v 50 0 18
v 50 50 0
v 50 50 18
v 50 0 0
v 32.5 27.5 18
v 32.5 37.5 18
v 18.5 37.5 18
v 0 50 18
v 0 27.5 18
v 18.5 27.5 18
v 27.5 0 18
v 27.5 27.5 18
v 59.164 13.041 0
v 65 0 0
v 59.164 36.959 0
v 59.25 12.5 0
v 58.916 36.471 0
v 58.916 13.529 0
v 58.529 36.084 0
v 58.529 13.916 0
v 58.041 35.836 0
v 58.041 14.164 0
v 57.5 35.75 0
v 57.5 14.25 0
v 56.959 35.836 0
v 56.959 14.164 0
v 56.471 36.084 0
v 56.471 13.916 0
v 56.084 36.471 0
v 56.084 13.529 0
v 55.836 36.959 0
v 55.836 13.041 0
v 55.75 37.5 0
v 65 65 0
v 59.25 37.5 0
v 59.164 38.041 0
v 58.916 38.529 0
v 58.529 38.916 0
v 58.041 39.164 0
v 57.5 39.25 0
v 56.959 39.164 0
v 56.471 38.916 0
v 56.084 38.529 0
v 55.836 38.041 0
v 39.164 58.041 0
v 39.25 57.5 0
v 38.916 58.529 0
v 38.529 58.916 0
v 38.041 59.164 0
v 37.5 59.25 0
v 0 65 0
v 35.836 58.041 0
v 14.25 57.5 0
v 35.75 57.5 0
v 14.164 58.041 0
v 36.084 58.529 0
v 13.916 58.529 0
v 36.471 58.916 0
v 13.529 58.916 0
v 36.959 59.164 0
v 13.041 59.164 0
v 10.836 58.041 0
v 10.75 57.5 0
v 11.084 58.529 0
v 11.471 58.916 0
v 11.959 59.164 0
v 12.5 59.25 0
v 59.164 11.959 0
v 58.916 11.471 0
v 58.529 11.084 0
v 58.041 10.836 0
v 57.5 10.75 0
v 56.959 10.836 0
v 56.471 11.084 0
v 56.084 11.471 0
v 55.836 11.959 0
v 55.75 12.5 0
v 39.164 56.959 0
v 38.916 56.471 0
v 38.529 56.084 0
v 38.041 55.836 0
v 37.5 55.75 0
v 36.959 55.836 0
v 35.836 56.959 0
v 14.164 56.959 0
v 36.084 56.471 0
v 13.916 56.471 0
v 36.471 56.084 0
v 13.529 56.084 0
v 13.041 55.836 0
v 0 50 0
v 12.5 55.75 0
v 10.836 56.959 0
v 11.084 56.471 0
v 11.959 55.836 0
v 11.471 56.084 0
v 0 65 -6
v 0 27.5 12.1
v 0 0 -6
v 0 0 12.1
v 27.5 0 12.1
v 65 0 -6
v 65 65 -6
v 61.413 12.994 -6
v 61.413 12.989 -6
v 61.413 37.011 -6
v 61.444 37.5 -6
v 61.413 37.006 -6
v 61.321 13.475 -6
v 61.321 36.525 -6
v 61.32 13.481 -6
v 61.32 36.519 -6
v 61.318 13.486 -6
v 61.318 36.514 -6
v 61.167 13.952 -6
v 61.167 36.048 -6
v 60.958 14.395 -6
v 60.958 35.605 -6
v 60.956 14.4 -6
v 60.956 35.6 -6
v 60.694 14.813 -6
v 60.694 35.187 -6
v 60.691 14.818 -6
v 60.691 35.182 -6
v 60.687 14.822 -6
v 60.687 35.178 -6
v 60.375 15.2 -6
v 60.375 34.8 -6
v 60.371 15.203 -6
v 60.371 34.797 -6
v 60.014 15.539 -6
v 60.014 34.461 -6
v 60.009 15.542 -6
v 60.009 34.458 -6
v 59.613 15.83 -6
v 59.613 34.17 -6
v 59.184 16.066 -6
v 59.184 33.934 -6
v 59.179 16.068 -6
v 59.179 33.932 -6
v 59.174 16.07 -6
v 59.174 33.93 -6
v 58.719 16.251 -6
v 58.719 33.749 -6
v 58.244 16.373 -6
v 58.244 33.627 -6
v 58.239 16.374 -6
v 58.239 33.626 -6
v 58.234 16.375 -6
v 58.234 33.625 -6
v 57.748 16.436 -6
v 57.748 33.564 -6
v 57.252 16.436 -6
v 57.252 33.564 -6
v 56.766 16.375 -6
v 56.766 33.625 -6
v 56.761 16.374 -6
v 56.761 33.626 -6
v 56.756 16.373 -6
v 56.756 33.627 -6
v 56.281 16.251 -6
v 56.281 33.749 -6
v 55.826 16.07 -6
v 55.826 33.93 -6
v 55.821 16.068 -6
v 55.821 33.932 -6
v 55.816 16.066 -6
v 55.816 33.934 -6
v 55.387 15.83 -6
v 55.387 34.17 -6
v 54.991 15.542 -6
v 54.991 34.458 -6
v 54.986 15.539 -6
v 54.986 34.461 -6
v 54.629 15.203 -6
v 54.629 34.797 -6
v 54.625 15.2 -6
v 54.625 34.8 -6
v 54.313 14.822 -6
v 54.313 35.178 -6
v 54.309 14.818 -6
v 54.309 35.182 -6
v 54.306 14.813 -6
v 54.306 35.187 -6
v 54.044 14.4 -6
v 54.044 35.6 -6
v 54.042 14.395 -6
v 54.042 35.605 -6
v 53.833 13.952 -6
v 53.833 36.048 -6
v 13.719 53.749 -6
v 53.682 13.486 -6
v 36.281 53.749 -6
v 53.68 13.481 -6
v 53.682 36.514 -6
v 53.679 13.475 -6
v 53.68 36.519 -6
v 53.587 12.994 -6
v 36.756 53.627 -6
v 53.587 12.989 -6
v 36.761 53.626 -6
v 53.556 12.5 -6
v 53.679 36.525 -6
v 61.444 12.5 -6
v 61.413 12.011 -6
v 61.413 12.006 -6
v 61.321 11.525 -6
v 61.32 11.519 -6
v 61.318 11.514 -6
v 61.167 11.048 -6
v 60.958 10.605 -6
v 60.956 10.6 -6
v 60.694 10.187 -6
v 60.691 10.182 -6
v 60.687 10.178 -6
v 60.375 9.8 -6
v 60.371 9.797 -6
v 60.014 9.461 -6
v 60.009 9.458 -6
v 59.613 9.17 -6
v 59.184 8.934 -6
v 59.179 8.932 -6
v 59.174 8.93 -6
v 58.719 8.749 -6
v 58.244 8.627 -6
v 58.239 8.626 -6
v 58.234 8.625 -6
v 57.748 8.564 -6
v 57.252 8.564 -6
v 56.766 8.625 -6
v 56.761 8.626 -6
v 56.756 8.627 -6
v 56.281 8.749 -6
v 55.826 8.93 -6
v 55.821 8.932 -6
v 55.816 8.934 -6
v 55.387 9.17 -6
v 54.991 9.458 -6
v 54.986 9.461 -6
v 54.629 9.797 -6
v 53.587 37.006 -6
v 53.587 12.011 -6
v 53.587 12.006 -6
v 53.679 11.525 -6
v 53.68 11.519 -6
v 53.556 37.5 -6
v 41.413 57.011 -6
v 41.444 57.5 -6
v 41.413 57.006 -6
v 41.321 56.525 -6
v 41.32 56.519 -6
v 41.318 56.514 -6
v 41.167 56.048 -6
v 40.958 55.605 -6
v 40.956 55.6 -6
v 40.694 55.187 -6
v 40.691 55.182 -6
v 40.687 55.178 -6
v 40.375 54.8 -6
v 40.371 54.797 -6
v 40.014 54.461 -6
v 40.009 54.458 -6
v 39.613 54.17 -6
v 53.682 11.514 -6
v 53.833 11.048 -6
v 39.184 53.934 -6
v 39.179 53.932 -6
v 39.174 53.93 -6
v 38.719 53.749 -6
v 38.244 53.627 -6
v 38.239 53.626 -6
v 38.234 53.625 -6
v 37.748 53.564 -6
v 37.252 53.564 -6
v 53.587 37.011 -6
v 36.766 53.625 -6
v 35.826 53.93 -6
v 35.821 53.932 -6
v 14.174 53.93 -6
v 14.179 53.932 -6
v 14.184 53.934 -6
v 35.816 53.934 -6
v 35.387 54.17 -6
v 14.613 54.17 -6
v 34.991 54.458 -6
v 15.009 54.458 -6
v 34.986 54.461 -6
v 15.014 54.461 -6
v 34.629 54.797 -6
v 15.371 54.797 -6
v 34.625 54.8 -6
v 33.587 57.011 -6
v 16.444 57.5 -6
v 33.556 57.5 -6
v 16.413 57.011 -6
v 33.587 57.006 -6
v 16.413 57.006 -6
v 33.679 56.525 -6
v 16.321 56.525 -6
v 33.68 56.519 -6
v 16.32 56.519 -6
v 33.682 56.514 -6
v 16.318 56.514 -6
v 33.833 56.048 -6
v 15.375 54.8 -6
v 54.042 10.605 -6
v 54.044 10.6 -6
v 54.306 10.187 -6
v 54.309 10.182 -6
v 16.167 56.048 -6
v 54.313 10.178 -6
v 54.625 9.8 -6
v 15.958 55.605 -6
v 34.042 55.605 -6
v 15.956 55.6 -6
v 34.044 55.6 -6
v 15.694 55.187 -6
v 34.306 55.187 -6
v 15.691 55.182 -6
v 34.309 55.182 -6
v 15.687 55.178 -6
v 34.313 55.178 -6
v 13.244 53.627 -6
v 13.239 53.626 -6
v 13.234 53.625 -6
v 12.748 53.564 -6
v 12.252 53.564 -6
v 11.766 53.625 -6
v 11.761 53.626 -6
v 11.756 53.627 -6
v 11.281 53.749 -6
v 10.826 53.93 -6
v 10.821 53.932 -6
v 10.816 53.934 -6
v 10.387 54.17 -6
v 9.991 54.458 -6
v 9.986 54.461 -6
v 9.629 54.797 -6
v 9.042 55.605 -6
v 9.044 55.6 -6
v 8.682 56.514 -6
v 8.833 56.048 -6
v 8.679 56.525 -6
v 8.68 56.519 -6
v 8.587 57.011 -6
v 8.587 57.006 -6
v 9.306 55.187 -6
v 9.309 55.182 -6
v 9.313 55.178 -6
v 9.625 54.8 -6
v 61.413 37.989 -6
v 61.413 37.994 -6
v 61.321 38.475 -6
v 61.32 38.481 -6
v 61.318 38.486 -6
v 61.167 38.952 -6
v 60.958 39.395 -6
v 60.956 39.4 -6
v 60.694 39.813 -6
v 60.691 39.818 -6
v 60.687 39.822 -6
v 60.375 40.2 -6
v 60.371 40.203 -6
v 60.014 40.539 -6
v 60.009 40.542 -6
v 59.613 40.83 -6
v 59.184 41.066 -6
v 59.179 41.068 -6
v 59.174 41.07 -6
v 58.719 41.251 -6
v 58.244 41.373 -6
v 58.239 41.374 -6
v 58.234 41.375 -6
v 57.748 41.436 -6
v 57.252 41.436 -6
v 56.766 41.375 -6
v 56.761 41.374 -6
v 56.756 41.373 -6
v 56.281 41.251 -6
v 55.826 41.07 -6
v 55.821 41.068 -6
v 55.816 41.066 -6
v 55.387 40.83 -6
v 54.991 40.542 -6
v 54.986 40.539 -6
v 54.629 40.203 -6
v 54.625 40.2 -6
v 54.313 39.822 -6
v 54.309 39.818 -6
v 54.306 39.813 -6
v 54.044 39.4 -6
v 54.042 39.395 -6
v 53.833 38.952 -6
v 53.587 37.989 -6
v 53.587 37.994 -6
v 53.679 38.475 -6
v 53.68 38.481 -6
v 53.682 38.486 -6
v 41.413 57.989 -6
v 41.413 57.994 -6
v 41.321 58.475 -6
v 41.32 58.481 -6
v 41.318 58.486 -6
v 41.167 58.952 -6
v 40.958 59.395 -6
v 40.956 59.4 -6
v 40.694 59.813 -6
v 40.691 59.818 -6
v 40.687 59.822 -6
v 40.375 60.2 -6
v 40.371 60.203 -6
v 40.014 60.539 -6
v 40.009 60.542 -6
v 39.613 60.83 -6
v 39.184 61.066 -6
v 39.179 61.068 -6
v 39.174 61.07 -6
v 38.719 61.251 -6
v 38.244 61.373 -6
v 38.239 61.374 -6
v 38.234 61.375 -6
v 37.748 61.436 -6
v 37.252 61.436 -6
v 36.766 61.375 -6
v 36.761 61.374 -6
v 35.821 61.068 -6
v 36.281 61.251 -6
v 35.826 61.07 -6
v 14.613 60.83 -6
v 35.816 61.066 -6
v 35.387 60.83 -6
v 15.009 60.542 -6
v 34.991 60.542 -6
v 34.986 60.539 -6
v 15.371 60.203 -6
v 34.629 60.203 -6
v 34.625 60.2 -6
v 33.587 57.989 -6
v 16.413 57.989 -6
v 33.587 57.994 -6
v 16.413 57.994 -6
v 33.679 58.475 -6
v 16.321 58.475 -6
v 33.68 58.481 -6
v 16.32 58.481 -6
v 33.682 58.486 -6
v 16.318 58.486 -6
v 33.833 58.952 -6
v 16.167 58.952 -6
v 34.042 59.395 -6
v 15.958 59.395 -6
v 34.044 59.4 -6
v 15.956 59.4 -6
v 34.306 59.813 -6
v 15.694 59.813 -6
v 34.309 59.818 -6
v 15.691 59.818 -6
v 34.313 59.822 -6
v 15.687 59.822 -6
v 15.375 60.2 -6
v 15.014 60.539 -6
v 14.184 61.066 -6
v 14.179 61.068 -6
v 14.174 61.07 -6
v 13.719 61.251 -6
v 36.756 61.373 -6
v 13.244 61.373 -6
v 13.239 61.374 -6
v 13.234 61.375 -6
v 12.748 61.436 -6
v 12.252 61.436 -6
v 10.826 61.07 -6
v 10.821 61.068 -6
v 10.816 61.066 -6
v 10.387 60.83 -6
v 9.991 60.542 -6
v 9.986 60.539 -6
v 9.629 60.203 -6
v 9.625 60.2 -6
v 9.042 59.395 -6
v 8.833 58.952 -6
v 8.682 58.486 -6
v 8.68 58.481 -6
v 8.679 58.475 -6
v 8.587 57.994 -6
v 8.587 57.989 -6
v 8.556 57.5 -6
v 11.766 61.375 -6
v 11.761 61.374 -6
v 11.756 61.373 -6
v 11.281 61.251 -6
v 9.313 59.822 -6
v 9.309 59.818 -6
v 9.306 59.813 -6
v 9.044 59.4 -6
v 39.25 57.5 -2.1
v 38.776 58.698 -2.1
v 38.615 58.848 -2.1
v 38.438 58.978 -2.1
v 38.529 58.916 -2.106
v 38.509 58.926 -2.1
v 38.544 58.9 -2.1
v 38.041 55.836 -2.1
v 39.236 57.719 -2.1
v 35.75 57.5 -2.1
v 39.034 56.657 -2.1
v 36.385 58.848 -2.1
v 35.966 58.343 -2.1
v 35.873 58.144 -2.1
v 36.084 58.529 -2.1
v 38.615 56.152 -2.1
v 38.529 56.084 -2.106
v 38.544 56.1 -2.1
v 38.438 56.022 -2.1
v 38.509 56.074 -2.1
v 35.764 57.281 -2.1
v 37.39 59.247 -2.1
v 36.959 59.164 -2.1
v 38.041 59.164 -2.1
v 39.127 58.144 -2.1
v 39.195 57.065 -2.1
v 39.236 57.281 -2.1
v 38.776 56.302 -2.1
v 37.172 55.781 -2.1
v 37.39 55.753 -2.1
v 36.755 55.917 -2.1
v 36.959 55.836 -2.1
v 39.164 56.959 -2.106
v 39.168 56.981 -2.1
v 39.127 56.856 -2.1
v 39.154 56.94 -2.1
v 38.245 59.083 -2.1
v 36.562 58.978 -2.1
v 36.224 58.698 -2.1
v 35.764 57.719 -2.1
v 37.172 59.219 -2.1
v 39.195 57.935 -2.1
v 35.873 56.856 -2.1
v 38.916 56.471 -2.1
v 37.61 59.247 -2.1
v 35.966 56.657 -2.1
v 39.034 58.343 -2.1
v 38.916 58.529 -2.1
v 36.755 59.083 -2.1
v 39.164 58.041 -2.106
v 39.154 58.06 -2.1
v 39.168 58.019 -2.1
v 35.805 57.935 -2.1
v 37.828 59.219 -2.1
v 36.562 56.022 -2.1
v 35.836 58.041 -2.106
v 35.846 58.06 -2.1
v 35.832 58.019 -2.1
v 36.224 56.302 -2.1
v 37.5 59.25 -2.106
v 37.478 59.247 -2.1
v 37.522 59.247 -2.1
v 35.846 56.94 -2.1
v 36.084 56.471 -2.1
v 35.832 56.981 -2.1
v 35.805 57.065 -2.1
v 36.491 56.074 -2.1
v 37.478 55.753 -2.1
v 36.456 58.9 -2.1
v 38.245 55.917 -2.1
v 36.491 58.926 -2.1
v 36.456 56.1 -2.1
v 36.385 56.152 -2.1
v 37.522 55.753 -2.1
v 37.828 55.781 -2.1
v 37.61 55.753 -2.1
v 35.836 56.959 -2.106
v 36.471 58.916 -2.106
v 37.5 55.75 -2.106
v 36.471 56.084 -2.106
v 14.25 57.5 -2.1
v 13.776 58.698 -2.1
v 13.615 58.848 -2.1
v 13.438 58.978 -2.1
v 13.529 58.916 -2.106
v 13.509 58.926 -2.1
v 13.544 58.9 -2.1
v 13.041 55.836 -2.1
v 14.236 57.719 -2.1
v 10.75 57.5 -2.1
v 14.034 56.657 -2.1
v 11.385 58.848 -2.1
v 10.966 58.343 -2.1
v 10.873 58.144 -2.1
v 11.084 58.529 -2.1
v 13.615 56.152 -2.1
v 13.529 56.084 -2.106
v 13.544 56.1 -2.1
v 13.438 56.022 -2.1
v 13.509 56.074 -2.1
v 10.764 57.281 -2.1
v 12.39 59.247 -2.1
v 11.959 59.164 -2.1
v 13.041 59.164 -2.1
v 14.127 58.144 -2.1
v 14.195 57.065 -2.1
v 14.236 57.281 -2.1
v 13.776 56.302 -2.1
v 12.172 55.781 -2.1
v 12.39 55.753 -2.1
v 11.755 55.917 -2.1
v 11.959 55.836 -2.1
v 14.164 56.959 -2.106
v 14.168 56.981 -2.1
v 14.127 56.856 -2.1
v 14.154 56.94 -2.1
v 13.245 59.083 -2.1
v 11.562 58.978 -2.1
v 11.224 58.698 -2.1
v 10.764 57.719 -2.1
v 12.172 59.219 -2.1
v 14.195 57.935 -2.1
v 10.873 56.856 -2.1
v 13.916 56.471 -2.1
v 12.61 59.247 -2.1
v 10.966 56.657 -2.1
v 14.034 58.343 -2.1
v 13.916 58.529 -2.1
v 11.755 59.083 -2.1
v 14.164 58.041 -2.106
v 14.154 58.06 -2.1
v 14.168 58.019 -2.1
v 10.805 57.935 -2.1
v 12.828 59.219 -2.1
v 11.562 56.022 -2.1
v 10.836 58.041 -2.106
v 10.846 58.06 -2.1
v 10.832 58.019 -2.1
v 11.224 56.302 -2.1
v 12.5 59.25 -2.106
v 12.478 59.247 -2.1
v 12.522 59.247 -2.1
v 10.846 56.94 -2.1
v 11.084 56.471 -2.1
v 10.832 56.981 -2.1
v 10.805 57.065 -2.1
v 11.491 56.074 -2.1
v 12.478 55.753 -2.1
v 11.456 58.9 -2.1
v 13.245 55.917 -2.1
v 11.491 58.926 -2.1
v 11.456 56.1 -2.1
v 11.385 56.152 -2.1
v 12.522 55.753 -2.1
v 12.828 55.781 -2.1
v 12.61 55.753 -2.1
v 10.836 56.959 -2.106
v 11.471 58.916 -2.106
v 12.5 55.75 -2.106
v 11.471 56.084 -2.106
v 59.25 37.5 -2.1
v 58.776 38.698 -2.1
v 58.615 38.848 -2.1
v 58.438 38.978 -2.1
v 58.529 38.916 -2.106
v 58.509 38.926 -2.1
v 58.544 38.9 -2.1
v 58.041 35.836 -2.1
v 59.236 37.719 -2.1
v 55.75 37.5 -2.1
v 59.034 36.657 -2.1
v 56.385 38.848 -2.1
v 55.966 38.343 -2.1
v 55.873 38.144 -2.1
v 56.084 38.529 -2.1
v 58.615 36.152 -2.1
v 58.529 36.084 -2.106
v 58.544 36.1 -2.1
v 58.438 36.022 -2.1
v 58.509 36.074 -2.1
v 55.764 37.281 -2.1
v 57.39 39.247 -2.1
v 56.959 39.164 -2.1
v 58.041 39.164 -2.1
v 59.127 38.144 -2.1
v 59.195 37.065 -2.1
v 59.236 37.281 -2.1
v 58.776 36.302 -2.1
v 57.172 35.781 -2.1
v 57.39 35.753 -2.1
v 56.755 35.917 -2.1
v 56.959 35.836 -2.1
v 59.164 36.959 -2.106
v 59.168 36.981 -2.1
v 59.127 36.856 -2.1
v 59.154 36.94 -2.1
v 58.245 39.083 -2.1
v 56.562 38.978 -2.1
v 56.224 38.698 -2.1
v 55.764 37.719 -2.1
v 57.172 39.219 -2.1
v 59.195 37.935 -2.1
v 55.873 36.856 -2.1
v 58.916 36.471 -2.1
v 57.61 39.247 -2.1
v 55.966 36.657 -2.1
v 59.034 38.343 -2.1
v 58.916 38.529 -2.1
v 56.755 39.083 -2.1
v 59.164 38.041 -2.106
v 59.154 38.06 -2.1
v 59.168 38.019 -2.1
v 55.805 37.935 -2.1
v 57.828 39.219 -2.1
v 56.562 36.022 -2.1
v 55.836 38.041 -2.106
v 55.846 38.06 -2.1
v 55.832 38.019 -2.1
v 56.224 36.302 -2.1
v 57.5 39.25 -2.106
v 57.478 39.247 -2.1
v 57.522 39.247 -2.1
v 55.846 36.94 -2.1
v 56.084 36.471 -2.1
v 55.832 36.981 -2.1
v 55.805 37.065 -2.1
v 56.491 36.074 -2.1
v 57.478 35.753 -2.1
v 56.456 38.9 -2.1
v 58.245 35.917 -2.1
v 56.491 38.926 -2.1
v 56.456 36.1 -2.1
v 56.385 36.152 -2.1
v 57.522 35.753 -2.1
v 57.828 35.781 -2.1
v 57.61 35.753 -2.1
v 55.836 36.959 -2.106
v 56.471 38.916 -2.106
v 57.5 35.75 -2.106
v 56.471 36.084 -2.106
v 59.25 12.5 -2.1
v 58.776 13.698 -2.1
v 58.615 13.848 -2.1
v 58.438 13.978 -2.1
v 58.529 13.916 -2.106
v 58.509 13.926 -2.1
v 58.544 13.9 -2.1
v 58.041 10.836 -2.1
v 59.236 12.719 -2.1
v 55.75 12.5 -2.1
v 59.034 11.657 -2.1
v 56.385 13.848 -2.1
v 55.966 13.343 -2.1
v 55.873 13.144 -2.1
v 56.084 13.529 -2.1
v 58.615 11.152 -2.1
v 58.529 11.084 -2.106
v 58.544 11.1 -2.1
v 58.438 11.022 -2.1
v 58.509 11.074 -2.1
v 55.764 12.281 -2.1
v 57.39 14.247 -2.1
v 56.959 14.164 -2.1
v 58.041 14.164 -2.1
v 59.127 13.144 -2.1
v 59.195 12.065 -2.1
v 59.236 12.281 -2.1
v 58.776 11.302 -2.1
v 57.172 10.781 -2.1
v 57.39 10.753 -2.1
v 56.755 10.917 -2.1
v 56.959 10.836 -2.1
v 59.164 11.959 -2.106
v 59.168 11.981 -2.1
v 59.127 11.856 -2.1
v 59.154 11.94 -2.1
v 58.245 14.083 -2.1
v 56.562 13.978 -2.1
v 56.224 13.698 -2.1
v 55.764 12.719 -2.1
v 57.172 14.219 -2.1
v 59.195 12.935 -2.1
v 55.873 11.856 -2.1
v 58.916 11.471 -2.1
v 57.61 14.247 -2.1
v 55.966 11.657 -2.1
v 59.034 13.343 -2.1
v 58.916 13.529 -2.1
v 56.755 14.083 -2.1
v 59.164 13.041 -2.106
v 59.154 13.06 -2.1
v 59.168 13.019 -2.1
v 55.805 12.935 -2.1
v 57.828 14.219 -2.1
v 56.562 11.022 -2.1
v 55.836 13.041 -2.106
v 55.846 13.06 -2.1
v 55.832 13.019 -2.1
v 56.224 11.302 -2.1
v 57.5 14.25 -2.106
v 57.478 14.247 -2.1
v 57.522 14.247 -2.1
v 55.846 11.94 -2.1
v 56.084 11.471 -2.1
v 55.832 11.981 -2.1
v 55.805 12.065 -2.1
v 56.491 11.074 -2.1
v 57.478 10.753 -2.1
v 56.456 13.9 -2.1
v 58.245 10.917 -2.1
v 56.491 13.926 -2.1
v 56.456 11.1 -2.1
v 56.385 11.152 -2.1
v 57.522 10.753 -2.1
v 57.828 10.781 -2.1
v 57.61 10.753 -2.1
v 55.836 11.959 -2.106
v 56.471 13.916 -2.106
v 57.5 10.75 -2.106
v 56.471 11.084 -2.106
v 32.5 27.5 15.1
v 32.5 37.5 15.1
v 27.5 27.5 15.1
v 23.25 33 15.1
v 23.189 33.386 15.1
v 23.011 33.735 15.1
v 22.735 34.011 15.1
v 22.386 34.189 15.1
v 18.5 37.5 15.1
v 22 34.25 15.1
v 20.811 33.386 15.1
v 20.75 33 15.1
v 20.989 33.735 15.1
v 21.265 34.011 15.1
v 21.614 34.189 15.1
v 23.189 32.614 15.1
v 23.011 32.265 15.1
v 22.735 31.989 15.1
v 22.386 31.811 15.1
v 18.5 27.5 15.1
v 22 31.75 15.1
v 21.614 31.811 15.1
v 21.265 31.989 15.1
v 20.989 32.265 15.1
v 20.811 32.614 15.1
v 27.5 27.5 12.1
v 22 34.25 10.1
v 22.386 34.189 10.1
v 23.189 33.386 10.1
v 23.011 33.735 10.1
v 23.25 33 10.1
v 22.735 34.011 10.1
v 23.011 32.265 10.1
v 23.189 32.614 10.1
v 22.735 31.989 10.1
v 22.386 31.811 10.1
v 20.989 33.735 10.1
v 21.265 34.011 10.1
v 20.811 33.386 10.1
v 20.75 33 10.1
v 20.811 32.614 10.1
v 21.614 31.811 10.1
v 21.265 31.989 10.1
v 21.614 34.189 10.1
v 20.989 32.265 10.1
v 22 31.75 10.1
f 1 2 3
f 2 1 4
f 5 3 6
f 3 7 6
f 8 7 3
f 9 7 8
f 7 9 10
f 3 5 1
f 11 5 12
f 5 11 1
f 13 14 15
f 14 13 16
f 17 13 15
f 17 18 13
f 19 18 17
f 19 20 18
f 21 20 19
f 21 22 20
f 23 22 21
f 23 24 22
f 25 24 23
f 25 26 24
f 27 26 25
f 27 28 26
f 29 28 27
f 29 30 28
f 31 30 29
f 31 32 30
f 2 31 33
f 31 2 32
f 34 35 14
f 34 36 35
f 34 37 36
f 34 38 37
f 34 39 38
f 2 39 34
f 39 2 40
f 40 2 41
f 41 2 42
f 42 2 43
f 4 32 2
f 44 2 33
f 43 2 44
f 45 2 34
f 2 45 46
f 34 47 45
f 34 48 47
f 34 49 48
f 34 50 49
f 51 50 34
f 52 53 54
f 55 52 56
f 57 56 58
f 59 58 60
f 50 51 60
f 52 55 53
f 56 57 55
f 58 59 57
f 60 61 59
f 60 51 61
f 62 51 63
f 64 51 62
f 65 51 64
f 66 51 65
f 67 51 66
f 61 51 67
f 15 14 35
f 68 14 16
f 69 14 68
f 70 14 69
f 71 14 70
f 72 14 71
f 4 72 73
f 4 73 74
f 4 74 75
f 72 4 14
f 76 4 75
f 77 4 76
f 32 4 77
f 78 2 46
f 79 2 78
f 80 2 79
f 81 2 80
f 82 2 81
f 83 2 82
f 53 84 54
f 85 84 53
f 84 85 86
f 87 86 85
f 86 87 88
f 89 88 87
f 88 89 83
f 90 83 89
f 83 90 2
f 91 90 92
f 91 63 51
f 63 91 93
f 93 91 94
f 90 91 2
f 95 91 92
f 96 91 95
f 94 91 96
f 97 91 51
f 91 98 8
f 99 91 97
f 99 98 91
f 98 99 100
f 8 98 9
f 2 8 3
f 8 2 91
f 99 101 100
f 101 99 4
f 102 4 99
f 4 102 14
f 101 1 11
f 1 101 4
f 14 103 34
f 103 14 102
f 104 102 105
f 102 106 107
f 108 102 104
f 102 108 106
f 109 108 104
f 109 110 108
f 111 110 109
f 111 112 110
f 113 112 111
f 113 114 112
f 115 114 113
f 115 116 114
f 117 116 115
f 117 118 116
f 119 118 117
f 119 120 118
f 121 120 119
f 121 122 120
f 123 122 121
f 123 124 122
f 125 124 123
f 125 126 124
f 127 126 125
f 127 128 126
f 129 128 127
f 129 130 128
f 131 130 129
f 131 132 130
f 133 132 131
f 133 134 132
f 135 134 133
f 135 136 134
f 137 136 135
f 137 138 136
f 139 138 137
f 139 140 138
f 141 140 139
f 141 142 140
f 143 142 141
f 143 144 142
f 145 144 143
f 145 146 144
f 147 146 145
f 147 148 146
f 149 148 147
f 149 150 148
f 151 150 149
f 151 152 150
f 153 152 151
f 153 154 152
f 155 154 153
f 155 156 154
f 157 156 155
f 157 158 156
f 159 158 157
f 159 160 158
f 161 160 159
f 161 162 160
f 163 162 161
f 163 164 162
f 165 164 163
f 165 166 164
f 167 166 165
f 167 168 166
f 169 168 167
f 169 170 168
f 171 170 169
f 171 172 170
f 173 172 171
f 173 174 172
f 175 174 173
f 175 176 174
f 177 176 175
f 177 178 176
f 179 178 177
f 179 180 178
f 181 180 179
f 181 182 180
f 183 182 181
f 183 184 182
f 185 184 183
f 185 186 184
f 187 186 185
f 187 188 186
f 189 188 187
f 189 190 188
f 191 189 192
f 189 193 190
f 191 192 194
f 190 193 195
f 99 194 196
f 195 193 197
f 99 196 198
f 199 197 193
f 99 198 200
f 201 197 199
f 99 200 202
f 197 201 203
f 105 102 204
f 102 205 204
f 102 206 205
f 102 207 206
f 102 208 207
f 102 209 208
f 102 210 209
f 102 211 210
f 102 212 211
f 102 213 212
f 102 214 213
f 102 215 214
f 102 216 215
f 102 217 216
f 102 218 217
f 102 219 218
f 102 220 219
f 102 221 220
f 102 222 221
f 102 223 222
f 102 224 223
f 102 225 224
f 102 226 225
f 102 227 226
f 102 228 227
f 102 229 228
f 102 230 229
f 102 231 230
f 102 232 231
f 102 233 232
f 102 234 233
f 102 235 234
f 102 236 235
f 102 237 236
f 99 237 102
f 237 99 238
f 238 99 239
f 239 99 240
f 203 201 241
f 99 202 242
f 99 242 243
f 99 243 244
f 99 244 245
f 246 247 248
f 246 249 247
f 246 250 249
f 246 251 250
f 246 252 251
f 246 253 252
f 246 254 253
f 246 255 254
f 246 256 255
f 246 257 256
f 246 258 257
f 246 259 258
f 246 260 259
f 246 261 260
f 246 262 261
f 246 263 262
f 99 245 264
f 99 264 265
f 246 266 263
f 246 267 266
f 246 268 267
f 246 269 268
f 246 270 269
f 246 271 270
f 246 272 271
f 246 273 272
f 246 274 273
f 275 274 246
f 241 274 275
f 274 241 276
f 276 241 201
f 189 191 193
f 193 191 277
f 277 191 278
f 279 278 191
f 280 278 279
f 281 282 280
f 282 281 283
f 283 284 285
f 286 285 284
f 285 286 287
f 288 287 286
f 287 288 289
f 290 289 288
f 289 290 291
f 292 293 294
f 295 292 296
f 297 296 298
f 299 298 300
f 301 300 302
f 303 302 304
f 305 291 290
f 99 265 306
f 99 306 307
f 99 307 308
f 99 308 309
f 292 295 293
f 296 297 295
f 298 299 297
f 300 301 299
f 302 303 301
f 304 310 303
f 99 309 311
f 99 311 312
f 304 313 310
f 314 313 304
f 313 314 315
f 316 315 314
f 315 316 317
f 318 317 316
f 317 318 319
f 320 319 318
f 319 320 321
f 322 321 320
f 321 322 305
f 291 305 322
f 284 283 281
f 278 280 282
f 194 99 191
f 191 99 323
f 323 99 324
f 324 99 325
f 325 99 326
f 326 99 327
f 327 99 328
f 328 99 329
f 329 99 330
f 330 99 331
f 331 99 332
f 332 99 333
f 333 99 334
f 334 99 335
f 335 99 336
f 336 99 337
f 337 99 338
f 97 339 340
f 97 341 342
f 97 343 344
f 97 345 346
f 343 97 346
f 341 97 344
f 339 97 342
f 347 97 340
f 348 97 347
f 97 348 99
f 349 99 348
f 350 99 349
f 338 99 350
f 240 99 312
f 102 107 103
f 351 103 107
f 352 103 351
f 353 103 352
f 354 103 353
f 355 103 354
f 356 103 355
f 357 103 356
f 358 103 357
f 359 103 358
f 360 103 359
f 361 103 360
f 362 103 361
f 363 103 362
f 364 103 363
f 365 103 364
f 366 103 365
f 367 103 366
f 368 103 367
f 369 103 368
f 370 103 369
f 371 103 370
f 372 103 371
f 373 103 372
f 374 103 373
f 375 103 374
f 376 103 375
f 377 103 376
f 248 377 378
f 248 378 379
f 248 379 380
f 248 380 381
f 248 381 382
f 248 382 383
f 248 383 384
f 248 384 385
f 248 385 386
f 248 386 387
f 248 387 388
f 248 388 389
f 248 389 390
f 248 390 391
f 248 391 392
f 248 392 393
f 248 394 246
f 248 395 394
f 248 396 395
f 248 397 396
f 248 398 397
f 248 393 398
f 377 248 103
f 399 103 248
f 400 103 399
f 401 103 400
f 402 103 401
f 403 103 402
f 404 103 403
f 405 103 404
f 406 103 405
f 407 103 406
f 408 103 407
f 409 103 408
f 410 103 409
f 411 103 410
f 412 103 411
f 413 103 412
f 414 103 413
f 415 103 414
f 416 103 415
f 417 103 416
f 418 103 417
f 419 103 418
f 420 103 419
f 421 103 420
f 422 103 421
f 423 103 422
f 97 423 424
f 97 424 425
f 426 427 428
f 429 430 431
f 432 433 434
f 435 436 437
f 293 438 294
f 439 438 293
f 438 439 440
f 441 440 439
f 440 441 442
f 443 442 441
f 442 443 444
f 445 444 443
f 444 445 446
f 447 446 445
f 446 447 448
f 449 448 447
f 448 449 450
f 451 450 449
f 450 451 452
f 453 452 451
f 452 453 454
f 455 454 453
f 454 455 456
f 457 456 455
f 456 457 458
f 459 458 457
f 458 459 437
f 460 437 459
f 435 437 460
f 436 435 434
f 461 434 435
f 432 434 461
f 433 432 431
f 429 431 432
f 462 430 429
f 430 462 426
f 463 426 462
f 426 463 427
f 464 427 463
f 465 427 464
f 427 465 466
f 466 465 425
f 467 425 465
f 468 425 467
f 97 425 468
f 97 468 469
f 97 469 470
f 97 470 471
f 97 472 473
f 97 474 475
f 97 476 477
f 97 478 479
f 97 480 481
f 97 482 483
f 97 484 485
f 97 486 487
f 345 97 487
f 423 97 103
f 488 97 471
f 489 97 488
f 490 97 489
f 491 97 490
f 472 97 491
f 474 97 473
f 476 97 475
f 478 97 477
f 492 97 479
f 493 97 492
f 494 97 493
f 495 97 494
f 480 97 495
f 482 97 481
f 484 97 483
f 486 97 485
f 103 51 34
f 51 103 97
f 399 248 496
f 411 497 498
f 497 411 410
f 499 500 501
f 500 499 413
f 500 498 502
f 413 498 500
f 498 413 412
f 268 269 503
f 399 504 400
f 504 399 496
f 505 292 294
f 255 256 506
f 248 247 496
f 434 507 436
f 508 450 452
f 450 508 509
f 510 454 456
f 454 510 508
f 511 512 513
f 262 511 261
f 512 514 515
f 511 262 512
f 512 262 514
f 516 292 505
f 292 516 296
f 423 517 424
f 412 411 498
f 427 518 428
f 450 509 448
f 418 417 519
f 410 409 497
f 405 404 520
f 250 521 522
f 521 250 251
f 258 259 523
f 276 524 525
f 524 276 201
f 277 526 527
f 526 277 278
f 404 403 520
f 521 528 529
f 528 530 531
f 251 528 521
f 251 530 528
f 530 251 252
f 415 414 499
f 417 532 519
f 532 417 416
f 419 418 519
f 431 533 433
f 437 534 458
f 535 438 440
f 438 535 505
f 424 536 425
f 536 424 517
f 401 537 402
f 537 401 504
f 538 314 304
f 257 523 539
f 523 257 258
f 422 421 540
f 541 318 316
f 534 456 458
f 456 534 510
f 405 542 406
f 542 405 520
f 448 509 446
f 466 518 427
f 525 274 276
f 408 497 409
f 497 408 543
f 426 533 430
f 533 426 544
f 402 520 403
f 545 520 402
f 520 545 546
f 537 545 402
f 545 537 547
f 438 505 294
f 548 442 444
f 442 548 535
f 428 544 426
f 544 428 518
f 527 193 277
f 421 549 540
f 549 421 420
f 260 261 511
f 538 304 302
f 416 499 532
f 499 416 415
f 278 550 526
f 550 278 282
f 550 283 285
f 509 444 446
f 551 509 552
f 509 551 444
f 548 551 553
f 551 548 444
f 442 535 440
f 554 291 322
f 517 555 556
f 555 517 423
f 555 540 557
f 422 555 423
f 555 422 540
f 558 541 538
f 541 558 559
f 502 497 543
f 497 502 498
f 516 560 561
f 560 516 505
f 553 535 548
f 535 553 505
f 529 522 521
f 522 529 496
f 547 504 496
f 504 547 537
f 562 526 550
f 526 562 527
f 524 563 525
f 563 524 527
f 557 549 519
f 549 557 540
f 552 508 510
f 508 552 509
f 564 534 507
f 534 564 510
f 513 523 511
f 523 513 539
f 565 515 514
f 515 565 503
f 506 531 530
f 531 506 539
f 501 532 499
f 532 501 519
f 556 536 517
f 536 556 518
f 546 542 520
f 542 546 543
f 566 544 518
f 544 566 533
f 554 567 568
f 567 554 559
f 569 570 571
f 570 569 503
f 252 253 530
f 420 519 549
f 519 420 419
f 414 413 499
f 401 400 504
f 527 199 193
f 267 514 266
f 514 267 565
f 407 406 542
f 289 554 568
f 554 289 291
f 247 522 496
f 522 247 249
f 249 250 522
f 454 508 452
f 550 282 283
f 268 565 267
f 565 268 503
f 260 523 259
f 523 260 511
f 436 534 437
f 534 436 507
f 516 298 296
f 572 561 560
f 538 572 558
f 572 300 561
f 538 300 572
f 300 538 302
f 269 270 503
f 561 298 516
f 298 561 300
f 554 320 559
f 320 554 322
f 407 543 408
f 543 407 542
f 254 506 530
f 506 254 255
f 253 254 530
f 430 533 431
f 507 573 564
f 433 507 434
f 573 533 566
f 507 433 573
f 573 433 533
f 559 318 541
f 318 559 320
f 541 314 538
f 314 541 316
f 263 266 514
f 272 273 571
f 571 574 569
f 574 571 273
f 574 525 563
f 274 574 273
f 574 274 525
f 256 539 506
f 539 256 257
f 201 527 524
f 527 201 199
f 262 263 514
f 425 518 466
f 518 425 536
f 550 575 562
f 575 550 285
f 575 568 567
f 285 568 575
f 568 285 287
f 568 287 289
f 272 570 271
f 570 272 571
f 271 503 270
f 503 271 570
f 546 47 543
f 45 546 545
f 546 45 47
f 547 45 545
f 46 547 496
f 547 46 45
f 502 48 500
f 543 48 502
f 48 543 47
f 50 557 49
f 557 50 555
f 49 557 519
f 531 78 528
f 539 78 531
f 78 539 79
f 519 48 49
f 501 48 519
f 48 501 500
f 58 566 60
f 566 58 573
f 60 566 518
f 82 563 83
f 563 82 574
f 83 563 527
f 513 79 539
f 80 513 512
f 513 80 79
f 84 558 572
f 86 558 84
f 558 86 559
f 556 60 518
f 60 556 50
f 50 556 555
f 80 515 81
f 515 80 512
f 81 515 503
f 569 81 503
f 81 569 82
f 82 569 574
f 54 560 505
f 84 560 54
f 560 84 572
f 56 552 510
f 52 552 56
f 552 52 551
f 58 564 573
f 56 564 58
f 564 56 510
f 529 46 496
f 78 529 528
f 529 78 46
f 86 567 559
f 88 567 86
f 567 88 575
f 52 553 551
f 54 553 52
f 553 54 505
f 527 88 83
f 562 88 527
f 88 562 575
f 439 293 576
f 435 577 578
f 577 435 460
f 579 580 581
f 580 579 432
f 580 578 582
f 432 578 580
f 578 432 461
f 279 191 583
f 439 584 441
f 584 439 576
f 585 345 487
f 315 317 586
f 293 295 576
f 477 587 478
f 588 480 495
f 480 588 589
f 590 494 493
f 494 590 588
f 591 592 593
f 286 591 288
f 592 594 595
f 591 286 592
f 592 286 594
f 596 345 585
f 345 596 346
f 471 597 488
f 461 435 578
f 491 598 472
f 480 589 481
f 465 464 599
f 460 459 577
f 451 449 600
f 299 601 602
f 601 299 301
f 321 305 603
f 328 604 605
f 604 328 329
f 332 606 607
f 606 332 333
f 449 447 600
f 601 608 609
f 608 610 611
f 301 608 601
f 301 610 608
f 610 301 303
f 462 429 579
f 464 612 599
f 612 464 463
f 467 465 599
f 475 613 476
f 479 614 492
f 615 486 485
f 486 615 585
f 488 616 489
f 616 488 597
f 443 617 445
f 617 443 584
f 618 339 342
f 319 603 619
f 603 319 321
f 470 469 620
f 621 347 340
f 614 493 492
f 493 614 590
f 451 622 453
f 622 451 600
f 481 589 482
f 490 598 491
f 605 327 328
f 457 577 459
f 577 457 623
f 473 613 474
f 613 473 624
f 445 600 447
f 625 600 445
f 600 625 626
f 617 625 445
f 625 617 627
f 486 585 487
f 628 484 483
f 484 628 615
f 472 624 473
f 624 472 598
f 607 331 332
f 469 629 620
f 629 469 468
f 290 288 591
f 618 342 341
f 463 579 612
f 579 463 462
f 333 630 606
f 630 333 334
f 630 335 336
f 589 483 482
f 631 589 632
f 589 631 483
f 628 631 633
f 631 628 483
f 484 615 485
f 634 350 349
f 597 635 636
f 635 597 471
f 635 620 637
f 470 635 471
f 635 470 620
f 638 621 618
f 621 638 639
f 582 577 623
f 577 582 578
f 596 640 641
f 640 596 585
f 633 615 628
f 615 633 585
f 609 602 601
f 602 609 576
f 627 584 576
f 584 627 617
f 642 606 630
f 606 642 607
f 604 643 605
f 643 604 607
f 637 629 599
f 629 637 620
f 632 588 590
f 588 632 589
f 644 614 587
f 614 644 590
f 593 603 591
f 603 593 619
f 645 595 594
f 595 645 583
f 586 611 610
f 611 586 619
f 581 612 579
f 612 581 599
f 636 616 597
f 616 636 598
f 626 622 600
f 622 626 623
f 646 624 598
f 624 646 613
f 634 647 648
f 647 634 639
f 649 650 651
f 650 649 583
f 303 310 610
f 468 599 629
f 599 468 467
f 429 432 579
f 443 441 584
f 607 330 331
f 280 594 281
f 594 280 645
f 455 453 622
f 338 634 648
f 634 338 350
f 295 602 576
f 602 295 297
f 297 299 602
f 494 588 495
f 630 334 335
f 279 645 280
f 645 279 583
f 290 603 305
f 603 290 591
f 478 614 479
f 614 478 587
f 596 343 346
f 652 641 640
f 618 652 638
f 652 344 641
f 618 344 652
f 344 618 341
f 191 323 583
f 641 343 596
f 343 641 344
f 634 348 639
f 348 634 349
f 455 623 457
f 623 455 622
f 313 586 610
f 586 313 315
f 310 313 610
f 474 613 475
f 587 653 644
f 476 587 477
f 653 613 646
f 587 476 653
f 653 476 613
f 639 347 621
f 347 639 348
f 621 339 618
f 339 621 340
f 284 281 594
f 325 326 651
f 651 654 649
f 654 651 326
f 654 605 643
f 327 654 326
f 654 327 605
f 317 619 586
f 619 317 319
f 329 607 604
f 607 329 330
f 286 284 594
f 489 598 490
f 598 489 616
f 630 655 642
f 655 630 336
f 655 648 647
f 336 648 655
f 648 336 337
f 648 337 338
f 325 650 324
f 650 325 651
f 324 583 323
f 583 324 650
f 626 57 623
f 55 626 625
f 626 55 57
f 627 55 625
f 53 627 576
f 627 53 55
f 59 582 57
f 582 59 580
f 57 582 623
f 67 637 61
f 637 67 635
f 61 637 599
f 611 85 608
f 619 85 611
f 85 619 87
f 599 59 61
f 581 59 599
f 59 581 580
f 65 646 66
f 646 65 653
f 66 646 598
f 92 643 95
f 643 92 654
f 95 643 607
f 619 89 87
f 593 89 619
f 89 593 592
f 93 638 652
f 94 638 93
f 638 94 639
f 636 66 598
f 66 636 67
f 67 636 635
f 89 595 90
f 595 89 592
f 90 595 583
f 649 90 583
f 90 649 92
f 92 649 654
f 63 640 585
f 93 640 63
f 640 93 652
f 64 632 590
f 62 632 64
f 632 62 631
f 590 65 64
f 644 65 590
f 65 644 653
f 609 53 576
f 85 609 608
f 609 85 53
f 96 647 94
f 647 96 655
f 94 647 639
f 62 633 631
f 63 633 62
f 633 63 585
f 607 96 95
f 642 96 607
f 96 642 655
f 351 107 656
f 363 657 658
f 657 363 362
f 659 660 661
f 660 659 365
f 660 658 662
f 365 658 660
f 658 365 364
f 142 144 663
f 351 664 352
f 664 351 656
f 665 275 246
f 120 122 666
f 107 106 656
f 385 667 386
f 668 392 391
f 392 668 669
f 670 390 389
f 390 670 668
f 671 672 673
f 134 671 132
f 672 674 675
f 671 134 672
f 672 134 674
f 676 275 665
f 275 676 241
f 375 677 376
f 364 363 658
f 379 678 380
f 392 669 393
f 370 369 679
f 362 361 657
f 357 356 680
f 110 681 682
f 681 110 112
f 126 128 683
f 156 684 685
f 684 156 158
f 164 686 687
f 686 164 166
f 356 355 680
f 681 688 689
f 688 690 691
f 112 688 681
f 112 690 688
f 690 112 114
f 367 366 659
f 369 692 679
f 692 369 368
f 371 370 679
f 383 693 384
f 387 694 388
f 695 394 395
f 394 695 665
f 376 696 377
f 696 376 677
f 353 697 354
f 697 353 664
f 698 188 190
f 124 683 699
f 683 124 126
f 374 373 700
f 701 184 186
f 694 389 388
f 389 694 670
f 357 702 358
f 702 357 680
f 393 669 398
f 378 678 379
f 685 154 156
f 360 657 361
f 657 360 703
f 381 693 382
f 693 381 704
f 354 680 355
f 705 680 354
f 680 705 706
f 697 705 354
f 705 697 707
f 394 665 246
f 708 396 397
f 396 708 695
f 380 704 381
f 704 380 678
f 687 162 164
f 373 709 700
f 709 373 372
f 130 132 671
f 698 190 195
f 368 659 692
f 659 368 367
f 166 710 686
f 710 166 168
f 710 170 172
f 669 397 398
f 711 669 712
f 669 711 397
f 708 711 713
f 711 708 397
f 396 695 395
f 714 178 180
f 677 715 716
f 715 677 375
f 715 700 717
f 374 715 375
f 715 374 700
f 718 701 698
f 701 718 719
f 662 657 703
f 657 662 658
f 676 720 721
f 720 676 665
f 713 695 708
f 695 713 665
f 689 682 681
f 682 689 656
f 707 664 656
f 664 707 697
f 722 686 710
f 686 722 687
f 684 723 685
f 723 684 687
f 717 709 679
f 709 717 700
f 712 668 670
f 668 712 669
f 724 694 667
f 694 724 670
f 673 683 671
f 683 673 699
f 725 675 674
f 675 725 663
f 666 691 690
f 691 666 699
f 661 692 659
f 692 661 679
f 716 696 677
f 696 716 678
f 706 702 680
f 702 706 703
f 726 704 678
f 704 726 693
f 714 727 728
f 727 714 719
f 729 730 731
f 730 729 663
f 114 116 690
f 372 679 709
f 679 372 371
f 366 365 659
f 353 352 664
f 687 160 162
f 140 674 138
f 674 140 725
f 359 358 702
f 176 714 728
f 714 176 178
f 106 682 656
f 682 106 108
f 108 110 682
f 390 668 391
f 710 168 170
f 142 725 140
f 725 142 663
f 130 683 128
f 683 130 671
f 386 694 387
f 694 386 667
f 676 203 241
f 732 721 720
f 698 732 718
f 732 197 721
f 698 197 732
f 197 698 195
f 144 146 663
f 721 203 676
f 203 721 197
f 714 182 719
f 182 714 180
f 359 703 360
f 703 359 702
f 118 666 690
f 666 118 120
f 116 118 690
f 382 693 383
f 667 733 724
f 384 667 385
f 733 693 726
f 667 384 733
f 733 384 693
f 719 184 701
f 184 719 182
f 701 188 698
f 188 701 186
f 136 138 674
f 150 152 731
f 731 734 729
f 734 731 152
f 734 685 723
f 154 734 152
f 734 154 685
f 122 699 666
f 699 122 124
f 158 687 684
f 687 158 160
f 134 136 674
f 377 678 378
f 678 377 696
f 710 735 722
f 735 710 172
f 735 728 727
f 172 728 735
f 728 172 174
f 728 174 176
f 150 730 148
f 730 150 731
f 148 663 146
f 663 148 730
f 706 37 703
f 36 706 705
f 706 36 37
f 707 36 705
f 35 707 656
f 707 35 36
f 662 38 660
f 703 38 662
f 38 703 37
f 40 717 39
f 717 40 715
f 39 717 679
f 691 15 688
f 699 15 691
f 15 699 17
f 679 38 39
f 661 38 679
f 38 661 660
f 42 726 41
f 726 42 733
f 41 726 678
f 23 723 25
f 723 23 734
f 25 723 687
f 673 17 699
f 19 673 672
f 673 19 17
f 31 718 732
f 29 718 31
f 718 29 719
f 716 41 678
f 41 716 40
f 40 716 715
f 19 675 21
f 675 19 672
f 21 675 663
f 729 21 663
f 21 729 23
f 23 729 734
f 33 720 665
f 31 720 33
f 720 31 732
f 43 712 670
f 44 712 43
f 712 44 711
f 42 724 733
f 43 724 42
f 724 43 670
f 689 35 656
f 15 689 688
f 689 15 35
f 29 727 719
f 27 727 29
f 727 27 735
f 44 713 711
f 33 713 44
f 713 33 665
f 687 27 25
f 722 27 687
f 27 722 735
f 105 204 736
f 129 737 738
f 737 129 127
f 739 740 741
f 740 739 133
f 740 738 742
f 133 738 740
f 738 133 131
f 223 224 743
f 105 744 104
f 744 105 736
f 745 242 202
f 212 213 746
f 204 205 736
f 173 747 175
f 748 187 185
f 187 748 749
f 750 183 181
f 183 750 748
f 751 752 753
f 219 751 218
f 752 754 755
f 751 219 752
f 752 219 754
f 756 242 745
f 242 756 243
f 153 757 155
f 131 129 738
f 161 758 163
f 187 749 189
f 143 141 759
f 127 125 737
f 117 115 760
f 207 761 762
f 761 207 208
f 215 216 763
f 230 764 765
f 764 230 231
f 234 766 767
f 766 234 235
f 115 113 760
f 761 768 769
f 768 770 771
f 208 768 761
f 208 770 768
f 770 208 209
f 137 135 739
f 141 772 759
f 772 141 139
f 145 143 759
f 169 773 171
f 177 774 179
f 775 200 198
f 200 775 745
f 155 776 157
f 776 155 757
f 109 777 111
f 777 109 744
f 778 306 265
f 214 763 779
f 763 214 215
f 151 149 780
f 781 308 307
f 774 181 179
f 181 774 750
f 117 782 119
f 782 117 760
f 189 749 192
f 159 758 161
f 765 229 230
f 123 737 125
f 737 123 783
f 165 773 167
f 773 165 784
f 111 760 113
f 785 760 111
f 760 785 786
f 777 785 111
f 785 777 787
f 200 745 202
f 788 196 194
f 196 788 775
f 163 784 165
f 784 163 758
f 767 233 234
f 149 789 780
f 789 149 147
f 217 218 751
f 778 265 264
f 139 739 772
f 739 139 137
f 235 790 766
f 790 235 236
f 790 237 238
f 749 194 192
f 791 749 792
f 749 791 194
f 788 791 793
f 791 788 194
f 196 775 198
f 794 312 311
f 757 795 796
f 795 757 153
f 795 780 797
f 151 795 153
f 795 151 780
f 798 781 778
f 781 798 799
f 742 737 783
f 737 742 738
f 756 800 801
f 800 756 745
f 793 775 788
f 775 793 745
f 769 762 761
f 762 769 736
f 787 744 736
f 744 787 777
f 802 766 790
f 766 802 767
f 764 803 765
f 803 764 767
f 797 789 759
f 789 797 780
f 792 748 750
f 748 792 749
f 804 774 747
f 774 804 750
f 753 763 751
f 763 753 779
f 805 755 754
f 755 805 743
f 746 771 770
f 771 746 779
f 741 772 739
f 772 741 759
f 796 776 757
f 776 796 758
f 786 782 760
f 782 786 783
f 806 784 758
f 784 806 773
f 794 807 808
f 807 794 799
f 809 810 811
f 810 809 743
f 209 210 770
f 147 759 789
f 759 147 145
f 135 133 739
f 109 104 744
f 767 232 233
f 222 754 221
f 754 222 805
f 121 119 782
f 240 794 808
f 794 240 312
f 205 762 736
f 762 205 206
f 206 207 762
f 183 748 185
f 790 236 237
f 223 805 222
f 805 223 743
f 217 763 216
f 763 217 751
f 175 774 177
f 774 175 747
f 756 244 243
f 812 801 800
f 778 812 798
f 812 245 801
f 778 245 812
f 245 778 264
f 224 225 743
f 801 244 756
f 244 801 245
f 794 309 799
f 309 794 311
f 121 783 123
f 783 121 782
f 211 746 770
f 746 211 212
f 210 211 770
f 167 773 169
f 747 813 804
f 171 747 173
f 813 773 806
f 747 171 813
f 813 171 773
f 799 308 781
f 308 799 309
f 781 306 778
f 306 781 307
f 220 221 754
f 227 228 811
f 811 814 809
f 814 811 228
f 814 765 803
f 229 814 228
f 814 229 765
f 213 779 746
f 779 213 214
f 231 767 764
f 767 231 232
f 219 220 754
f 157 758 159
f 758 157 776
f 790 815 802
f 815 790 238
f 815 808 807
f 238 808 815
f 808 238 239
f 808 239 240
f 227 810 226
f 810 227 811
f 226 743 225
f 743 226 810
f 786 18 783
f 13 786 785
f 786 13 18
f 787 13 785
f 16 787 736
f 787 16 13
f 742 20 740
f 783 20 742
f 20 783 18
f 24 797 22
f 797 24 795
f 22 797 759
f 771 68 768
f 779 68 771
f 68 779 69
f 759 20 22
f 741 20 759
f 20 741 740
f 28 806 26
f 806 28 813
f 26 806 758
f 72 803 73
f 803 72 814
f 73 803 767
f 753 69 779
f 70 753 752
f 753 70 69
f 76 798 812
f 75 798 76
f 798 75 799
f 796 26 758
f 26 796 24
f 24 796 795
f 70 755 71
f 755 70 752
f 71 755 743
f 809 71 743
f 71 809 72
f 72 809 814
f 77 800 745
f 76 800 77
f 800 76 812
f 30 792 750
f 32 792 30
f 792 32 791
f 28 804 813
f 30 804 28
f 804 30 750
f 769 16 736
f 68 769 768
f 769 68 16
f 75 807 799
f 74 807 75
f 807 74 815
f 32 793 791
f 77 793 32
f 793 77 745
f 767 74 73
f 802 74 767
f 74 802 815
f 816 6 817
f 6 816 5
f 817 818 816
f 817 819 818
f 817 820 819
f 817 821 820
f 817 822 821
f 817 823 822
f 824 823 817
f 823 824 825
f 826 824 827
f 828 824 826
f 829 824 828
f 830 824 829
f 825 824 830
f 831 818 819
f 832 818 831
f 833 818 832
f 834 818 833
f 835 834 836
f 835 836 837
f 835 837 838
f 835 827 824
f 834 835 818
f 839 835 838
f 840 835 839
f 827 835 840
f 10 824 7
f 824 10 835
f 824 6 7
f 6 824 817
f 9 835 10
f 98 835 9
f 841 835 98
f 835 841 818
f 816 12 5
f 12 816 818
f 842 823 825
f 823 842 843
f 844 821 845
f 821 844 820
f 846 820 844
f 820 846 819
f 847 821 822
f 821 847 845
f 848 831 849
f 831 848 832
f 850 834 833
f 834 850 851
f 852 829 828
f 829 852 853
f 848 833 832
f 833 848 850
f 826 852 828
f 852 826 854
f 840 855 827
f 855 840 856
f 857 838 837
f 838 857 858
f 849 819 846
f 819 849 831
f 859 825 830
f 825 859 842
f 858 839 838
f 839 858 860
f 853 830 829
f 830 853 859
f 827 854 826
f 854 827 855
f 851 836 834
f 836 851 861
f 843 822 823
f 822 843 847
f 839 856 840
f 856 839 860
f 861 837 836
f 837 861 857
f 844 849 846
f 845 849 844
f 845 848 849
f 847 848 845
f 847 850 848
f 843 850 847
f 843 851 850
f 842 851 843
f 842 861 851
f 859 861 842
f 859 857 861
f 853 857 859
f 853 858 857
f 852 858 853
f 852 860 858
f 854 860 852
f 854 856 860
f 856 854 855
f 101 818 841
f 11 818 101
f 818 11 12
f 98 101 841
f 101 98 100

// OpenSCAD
epaisseur_plache=18;
epaisseur_ecran=6;
largeur_ecran=245;
longueur_ecran=385;
largeur_fixation=50;
epaisseur_accroche=3;
bordure=15;

module accroche_top(){
    cube([14,10,epaisseur_accroche]);
    translate([3.5,5.5,-5])
    cylinder(d=2.5, h=10, $fn=20);
}

module accroche_bottom(){
    cube([24,20,epaisseur_accroche]);
    translate([9,24-14,-5])
    cylinder(d=2.5, h=10, $fn=20);
}

module screen(){
    cube([longueur_ecran,largeur_ecran,epaisseur_ecran],center=true);
    translate([longueur_ecran/2-9,largeur_ecran/2,0])
    accroche_top();
    translate([-(longueur_ecran/2-14+(14-9)),10+largeur_ecran/2,0])
    rotate([0,0,180])
    accroche_top();
    
    translate([24-longueur_ecran/2,20-largeur_ecran/2-20,0])
    rotate([0,0,180])
    accroche_bottom();
    translate([longueur_ecran/2-24,-largeur_ecran/2-20,0])
    accroche_bottom();
}

module base_fixation(){
    translate([largeur_fixation/2,largeur_fixation/2,epaisseur_plache/2])
    difference(){
    union(){
    cube([largeur_fixation,largeur_fixation,epaisseur_plache],center=true);
        translate([bordure/2, bordure/2, -(epaisseur_ecran+epaisseur_plache)/2])
        cube([largeur_fixation+bordure,largeur_fixation+bordure,epaisseur_ecran],center=true);
    }
    translate([largeur_fixation/4,(largeur_fixation+bordure)/2,-(epaisseur_ecran+0.1+epaisseur_plache/2)])
    vis();
    translate([-largeur_fixation/4,(largeur_fixation+bordure)/2,-(epaisseur_ecran+0.1+epaisseur_plache/2)])
    vis();
    translate([(largeur_fixation+bordure)/2,largeur_fixation/4,-(epaisseur_ecran+0.1+epaisseur_plache/2)])
    vis();
    translate([(largeur_fixation+bordure)/2,-largeur_fixation/4,-(epaisseur_ecran+0.1+epaisseur_plache/2)])
    vis();
    }
}

module fixation_haut_droit(){
    difference(){
        base_fixation();
        translate([largeur_fixation-1.5*bordure, largeur_fixation-1.5*bordure, epaisseur_plache-epaisseur_ecran+0.1])
        translate([-longueur_ecran/2, -largeur_ecran/2, epaisseur_ecran/2])
    #screen();
    }
}

module fixation_haut_gauche(){
    difference(){
        rotate([0,0,90])
        base_fixation();
        translate([-(largeur_fixation-1.5*bordure), largeur_fixation-1.5*bordure, epaisseur_plache-epaisseur_ecran+0.1])
        translate([longueur_ecran/2, -largeur_ecran/2, epaisseur_ecran/2])
    #screen();
    }
}

module fixation_bas_droit(){
    difference(){
        rotate([0,0,-90])
        base_fixation();
        translate([(largeur_fixation-1.5*bordure), -(largeur_fixation-1.5*bordure), epaisseur_plache-epaisseur_ecran+0.1])
        translate([-longueur_ecran/2, largeur_ecran/2, epaisseur_ecran/2])
    #screen();
    }
}

module fixation_bas_gauche(){
    difference(){
        rotate([0,0,180])
        base_fixation();
        translate([-(largeur_fixation-1.5*bordure), -(largeur_fixation-1.5*bordure), epaisseur_plache-epaisseur_ecran+0.1])
        translate([longueur_ecran/2, largeur_ecran/2, epaisseur_ecran/2])
    #screen();
    }
}

module vis(){
    cylinder(d1=8, d2=3.5, h=4, $fn=50);
    cylinder(d=3.5, h=30, $fn=20);
}

fixation_haut_droit();
